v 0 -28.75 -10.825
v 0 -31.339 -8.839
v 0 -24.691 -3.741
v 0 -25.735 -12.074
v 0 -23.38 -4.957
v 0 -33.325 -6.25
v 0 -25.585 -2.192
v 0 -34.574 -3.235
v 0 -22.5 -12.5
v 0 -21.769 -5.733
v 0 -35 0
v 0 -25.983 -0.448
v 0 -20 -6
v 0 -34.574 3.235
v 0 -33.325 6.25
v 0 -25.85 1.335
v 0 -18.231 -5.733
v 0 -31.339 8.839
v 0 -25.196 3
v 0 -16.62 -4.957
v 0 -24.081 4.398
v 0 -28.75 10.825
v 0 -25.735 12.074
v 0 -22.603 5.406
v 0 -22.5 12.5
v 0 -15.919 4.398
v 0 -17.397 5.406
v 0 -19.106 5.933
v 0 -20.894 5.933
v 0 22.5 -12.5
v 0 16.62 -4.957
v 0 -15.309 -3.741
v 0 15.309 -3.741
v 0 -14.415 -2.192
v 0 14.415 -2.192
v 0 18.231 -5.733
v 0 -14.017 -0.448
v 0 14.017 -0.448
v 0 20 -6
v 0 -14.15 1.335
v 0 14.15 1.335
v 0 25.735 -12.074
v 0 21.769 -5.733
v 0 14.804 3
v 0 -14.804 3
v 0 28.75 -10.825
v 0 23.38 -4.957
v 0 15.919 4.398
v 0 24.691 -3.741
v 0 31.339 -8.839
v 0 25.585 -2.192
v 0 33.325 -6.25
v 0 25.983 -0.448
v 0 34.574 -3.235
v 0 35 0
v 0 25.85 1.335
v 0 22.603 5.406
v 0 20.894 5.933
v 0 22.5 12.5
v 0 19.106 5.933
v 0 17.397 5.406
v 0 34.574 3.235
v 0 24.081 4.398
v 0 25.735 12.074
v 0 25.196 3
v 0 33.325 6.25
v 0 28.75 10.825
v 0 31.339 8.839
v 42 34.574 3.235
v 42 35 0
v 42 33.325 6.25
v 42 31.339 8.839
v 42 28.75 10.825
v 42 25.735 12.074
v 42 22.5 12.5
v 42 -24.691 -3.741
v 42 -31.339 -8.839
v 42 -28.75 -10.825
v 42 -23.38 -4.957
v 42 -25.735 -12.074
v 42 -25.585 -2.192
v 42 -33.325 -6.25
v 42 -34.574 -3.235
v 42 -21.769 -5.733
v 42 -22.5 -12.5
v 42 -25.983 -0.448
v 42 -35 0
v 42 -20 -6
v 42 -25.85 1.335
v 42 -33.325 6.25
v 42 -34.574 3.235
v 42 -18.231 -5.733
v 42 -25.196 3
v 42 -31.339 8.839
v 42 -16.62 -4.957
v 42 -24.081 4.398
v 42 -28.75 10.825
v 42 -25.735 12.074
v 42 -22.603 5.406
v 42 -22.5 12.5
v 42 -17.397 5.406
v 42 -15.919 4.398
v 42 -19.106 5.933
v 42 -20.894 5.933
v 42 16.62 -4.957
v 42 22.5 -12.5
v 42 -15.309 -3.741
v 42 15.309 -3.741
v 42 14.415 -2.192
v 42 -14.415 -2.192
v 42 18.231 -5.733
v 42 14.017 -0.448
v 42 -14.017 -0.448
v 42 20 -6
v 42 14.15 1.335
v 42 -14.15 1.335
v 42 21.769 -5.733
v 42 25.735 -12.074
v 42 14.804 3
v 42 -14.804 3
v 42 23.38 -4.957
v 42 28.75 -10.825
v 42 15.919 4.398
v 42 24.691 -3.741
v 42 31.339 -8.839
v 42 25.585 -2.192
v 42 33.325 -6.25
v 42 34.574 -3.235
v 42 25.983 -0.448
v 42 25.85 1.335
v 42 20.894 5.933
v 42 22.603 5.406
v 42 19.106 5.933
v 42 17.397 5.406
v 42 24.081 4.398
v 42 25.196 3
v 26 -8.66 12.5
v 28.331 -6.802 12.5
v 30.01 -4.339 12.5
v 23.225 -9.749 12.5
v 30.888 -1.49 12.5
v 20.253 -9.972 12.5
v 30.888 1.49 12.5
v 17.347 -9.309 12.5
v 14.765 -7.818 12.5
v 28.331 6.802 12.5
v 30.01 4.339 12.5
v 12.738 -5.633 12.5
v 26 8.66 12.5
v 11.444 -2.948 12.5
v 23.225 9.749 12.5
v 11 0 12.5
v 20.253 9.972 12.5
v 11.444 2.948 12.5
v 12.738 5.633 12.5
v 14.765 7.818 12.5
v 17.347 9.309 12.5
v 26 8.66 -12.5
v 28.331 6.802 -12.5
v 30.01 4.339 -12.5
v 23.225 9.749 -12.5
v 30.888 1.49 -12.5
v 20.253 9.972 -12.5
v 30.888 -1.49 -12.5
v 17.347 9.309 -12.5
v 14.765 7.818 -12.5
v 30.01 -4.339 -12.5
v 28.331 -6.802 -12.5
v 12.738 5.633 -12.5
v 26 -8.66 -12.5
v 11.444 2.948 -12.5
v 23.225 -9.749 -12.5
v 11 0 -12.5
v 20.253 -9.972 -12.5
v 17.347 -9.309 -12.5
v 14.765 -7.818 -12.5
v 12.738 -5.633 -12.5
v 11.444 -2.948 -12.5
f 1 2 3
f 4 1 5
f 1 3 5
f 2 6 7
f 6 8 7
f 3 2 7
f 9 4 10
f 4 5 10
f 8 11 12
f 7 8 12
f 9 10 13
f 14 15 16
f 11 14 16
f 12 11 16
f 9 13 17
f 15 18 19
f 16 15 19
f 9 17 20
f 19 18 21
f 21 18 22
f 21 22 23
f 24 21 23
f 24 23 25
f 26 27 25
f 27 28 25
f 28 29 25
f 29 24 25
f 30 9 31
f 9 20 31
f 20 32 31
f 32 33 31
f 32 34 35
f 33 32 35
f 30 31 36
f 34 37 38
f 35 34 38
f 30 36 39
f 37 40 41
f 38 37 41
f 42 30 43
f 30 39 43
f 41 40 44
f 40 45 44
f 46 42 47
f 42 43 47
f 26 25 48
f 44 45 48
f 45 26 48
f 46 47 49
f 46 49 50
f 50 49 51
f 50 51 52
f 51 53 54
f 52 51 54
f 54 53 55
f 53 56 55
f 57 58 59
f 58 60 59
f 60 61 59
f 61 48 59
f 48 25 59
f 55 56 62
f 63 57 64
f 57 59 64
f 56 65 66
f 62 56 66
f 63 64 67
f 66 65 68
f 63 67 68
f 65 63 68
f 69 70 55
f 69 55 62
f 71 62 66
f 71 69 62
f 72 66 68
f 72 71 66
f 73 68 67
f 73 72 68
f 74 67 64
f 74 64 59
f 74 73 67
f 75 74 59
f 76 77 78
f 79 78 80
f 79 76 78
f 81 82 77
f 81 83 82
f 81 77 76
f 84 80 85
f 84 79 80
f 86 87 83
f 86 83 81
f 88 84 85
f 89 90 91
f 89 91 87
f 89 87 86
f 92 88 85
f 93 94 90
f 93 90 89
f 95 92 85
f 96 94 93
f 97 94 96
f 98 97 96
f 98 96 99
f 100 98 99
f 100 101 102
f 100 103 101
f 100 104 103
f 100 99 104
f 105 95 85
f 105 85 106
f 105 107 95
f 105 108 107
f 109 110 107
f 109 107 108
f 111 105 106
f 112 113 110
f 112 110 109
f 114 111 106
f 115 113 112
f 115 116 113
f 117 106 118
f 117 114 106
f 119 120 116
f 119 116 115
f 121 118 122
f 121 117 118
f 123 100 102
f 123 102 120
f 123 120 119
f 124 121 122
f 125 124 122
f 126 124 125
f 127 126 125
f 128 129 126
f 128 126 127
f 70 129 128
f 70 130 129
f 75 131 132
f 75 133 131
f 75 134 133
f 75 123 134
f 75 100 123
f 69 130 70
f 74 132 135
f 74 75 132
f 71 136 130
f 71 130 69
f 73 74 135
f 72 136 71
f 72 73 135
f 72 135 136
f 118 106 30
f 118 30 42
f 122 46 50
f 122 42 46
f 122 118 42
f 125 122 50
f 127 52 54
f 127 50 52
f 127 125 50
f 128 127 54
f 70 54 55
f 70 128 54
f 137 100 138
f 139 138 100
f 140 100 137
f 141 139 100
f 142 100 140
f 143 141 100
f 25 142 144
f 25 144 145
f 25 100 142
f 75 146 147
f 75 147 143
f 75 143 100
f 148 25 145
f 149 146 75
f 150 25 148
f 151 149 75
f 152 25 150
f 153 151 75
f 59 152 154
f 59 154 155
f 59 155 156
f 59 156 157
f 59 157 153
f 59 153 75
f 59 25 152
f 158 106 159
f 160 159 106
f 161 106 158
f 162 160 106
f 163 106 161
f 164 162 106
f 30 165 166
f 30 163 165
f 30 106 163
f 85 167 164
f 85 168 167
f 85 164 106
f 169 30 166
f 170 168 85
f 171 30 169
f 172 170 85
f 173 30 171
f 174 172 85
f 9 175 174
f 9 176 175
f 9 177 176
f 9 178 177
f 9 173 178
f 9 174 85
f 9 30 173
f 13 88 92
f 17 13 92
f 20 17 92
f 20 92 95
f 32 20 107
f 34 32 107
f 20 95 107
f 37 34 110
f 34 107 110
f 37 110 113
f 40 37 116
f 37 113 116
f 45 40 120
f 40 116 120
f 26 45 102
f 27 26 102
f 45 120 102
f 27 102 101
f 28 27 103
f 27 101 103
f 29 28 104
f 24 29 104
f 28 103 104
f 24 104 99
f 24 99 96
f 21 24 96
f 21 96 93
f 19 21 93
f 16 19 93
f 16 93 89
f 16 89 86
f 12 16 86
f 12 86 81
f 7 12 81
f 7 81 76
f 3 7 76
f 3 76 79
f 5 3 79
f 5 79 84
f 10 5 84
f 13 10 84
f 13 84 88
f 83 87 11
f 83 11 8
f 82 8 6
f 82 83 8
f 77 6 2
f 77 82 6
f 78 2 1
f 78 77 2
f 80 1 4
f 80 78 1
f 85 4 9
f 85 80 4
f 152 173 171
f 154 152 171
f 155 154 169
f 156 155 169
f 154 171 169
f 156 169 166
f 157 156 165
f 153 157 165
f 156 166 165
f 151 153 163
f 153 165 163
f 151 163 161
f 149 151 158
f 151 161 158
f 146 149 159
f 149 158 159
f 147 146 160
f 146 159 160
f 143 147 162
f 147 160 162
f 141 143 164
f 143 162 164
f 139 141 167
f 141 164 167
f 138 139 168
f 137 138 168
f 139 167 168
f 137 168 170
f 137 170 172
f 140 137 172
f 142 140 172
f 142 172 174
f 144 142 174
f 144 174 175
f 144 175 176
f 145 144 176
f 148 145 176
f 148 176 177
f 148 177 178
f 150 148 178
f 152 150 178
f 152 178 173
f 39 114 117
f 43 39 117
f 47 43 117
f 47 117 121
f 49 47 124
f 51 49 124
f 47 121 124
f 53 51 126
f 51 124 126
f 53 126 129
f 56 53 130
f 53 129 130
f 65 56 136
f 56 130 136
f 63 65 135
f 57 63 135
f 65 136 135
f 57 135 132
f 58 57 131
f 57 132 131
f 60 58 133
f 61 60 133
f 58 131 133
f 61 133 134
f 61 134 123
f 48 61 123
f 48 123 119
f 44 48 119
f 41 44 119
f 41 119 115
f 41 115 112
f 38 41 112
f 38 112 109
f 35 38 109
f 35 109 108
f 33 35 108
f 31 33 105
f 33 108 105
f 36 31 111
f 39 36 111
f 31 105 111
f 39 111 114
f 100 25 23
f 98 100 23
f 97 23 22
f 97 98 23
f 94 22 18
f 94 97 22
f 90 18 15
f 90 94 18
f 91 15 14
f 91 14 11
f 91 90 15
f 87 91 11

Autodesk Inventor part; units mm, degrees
ref_plane "YZ Plane" through (0, 0, 0) normal (1, 0, 0) x (0, 1, 0)
ref_plane "XZ Plane" through (0, 0, 0) normal (0, 1, 0) x (-1, 0, 0)
ref_plane "XY Plane" through (0, 0, 0) normal (0, 0, 1) x (1, 0, 0)
sketch "Sketch2" plane through (0, 0, 0) normal (1, 0, 0) x (0, 1, 0)
  line L0 (35, 12.5) -> (35, -12.5)
  line L1 (35, -12.5) -> (-35, -12.5)
  line L2 (-35, -12.5) -> (-35, 12.5)
  line L3 (-35, 12.5) -> (35, 12.5)
  point P0 (0, 0)
  dimension "d11" = 25
  dimension "d12" = 70
  dimension "d13" = 35
  dimension "d14" = 12.5
extrude "Extrusion2" add sketch "Sketch2" along normal blind 42
full round fillet "Full Round Fillet1" first side at (14, 11.6667, 12.5) centre faces at (14, 35, -4.1667) second side at (14, -11.6667, -12.5)
full round fillet "Full Round Fillet2" first side at (28, 3.3334, 12.5) centre faces at (14, -35, 4.1667) second side at (14, -15.8333, -12.5)
sketch "Sketch3" plane through (42, 22.5, -12.5) normal (0, 0, -1) x (-1, 0, 0)
  circle A0 centre (21, -22.5) radius 10
  line L0 (42, -45) -> (42, 0) projected
  point P0 (42, -22.5)
  point P1 (42, -22.5)
  dimension "d15" = 20
  dimension "d16" = 21
sketch "Sketch4" plane through (42, 0, 0) normal (1, 0, 0) x (0, 0, -1)
  circle A0 centre (0, -20) radius 6
  circle A1 centre (0, 20) radius 6
  point P0 (0, 0)
  dimension "d17" = 12
  dimension "d18" = 12
  dimension "d31" = 40
  dimension "d32" = 20
extrude "Extrusion3" cut sketch "Sketch3" against normal blind 42
extrude "Extrusion4" cut sketch "Sketch4" against normal blind 42
thread "Thread1" size "M12x1.75" class "6H" standard "ANSI Metric M Profile" full length
thread "Thread2" size "M12x1.75" class "6H" standard "ANSI Metric M Profile" full length
thread "Thread4" size "M20x2.5" class "6H" standard "ANSI Metric M Profile" full length
properties part number "Junção Fuso" material "Steel AISI 1050"
